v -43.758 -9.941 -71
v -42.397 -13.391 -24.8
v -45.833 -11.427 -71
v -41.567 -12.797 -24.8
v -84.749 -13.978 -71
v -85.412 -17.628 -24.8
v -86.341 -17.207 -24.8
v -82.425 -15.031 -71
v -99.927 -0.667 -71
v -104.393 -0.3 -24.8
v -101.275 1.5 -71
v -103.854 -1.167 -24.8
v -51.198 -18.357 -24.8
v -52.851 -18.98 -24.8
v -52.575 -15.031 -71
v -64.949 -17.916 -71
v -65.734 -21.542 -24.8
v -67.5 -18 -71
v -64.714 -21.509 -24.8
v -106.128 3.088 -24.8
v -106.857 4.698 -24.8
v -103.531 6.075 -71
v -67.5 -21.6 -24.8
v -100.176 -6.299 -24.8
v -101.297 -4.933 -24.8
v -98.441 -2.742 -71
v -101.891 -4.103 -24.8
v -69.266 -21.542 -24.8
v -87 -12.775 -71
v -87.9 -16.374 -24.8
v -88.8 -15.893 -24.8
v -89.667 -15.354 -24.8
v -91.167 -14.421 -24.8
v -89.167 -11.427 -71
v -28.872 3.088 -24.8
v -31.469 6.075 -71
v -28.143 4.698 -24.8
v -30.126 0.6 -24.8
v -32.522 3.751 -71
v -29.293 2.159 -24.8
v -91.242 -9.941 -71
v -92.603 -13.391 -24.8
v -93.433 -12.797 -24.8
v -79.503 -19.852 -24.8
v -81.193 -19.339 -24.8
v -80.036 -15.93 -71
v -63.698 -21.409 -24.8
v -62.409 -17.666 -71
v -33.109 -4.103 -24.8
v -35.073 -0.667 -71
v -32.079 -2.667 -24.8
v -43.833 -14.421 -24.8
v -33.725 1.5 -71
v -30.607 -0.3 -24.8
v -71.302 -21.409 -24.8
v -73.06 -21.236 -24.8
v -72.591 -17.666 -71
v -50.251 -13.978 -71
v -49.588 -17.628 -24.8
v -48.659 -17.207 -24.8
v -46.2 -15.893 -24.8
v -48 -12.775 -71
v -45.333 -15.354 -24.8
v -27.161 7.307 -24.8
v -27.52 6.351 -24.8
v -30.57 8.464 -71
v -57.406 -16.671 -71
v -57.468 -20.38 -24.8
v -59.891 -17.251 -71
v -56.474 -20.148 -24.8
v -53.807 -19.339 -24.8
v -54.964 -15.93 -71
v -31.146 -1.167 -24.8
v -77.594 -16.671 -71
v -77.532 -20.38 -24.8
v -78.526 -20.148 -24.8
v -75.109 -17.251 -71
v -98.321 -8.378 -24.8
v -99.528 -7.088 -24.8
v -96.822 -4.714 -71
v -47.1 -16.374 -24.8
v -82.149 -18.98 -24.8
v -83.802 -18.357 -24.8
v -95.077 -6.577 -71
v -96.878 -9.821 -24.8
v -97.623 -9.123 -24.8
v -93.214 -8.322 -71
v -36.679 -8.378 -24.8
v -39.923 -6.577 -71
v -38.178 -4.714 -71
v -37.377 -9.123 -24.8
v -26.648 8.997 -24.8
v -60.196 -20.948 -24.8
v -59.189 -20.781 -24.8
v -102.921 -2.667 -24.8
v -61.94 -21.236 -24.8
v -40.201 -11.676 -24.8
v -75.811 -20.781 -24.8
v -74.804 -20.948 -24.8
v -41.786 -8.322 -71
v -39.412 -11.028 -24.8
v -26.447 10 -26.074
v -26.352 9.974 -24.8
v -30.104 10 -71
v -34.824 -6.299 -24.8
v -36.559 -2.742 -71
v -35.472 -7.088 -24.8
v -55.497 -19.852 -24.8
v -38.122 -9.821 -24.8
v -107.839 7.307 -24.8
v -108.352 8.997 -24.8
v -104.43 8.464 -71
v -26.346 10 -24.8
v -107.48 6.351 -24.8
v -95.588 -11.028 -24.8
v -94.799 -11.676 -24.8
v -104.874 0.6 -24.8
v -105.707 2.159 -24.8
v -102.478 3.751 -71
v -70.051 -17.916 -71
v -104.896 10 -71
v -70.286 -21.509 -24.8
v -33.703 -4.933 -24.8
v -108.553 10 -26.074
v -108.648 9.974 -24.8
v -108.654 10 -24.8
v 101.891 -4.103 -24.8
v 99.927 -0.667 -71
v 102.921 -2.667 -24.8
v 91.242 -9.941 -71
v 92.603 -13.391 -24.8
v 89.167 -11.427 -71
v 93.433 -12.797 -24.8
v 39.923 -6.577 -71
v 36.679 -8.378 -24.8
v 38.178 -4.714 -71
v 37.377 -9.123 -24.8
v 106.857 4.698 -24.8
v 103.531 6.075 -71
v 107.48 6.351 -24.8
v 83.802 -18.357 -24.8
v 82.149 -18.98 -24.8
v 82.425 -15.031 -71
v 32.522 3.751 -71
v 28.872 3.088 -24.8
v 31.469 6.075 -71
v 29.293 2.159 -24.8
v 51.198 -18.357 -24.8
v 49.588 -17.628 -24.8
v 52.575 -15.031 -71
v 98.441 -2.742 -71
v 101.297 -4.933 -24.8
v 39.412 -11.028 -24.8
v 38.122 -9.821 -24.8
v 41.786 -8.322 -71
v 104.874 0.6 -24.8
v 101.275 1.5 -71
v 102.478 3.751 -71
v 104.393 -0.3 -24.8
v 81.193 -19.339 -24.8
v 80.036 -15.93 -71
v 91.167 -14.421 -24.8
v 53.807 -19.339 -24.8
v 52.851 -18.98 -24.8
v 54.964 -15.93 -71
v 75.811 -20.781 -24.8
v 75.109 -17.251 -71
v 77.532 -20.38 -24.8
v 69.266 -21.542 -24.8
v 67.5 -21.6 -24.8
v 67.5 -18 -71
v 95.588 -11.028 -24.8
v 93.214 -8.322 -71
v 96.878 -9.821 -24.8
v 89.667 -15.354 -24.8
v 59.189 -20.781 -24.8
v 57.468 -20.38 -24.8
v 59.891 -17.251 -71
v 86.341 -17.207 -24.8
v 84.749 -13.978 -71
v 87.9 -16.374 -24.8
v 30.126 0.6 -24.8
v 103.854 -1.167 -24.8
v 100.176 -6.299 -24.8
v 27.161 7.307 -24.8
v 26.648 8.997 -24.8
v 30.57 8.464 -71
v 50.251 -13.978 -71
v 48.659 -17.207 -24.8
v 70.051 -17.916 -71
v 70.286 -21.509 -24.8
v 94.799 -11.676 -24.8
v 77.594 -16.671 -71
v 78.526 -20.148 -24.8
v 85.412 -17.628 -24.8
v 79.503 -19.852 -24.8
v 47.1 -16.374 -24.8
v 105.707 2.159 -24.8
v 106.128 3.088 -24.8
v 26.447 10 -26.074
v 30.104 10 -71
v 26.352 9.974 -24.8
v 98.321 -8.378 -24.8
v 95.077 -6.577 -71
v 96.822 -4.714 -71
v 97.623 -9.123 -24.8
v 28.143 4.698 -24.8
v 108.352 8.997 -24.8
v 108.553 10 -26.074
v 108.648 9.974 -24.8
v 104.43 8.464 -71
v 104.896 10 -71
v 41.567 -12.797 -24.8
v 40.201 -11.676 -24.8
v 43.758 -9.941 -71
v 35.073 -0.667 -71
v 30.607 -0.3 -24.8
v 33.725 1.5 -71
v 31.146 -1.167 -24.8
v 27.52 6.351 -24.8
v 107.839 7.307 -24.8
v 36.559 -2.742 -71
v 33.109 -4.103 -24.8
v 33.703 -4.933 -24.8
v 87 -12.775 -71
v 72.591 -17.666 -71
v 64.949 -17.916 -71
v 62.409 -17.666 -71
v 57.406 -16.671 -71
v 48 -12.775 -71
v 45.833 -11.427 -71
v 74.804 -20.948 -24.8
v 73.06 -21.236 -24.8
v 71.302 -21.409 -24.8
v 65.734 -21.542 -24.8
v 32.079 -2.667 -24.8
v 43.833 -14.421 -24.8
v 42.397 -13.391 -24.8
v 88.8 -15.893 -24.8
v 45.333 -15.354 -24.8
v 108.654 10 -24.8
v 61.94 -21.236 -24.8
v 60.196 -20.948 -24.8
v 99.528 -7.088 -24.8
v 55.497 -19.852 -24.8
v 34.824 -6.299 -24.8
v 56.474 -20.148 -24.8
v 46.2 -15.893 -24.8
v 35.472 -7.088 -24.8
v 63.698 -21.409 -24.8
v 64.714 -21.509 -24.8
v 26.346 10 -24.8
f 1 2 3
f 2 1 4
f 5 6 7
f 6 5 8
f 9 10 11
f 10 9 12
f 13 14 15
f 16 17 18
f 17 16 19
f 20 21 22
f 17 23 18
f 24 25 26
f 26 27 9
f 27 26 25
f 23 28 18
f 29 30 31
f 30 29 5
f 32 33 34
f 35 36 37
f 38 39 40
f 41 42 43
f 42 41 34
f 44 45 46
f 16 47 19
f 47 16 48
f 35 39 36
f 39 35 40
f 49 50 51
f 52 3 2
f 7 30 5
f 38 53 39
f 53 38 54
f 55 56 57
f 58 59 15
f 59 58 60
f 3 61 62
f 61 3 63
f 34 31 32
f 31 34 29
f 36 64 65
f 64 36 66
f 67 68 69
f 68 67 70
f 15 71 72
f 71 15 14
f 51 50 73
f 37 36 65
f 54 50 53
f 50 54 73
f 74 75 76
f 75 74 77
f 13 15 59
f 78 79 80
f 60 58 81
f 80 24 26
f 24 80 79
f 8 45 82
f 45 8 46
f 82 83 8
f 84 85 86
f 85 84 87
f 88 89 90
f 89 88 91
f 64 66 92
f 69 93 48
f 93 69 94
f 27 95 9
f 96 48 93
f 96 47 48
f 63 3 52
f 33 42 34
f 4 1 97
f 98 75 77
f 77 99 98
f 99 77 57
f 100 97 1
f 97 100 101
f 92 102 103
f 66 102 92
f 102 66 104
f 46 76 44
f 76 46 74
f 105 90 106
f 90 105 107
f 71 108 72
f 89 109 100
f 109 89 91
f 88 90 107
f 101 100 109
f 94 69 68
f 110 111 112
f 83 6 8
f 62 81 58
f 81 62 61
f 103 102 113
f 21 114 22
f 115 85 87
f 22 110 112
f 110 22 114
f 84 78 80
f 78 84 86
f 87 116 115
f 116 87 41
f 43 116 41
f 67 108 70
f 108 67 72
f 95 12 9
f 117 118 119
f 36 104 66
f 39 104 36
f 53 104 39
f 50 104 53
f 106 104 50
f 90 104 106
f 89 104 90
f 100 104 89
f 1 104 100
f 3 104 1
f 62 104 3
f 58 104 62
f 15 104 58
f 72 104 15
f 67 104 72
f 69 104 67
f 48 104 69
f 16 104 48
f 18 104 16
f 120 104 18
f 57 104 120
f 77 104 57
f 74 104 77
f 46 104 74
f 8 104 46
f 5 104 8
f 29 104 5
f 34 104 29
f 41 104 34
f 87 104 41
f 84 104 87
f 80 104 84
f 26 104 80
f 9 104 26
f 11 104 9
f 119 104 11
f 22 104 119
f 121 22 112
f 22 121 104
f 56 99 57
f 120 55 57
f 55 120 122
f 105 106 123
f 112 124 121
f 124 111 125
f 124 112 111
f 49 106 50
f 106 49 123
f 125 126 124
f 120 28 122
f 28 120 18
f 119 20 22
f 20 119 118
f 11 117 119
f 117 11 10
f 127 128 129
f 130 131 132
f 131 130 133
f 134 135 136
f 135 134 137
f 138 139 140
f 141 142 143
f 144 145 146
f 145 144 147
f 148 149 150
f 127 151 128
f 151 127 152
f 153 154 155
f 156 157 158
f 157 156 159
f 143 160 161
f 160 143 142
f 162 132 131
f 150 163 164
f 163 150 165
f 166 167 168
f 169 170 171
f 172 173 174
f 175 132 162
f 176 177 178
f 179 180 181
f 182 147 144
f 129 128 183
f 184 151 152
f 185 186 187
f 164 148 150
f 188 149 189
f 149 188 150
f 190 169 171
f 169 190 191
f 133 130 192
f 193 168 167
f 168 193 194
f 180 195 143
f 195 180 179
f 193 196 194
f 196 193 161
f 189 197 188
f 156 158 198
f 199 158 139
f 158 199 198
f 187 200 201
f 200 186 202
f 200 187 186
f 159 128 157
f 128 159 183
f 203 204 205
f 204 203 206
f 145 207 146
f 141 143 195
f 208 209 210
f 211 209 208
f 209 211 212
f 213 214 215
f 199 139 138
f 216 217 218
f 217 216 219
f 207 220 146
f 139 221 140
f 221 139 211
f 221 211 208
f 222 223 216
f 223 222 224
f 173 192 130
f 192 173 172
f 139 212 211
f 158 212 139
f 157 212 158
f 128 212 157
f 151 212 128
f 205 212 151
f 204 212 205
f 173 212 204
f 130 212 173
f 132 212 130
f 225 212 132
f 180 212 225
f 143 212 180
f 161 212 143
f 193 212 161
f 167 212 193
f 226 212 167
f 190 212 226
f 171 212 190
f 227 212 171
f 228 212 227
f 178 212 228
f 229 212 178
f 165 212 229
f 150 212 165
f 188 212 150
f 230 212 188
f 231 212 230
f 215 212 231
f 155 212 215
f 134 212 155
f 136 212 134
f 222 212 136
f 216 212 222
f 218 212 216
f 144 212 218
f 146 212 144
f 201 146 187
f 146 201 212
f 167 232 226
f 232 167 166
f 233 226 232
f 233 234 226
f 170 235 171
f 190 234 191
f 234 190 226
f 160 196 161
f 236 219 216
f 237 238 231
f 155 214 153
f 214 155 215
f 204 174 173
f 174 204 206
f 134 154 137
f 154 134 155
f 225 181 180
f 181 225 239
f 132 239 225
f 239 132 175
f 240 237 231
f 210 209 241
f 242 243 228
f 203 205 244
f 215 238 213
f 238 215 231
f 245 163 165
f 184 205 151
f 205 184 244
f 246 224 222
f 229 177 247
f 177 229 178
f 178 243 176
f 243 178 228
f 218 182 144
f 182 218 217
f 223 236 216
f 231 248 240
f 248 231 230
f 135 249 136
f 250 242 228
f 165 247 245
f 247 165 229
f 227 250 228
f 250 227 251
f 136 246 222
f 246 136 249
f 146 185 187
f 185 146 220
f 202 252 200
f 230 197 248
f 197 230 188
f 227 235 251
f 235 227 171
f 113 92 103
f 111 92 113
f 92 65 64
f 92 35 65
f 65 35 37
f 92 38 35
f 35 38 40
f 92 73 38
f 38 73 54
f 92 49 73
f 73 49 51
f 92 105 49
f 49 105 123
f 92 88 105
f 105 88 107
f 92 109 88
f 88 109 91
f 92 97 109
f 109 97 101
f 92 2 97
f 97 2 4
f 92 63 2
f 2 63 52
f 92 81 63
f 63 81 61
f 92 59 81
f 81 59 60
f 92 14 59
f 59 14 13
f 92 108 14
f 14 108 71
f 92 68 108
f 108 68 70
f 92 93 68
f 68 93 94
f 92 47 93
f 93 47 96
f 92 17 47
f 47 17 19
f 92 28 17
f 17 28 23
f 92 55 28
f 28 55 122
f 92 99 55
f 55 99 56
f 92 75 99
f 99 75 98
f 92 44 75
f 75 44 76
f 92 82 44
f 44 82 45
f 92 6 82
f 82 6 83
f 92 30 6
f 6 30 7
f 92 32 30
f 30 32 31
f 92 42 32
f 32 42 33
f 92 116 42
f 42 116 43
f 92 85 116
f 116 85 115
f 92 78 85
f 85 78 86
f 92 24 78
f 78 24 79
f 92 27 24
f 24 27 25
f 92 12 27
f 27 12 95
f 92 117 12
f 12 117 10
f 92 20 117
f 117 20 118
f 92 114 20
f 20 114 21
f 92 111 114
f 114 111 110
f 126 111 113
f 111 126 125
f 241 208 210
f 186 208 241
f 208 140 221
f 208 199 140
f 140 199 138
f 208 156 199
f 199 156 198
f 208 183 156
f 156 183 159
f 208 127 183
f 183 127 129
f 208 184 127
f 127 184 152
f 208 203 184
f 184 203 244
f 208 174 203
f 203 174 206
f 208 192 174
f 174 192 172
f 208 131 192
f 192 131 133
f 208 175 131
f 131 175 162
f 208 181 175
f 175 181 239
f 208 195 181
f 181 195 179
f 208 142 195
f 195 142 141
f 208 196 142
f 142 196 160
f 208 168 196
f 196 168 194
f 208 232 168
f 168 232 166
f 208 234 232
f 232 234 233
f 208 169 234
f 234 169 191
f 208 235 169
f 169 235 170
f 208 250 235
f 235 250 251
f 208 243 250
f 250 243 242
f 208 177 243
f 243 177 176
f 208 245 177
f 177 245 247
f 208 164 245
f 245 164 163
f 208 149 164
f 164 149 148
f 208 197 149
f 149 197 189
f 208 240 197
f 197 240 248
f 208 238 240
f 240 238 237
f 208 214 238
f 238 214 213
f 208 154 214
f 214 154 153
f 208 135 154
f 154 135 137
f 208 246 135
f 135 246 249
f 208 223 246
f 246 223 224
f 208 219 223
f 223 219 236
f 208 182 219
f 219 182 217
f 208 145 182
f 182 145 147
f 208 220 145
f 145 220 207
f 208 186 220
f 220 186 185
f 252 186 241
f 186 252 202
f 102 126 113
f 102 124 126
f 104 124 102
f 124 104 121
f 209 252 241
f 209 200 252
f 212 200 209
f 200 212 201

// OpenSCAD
// file: ../../lib/project/util.scad
// lib/project/util.scad

module rounded_rect_2d(size = [10, 10], r = 2) {
  x = size[0];
  y = size[1];
  rr = min(r, min(x, y) / 2);

  hull() {
    for (sx = [-1, 1], sy = [-1, 1]) {
      translate([sx * (x / 2 - rr), sy * (y / 2 - rr)])
        circle(r = rr);
    }
  }
}
// file: ../../lib/project/params.scad
// lib/project/params.scad
// Shared project parameters for the final tray and all fit-test models.

debug = false;

// Main tray footprint.
tray_corner_r = 15;

// Top tray shell.
tray_floor_t = 2.4;
tray_wall_h = 14;
top_wall_w = 10;
glue_rabbet_h = 1.6;
glue_rabbet_w = 3.2;
glue_rabbet_side_clearance = 0.3;
glue_rabbet_vertical_clearance = 0.5;

// Underside support lip and rear support section.
support_lip_drop = 15;
support_lip_w = 10;
front_lip_back_extra = 5;
front_lip_bottom_back_extra = 0;
console_clear_w = 320;
side_lip_run = 170;
tray_w = console_clear_w + 2 * support_lip_w;
tray_d = side_lip_run + support_lip_w;
front_extension = 35;
rear_gap_w = 28;
rear_tongue_side_margin = 20;
rear_tongue_w = tray_w - 2 * rear_tongue_side_margin;
rear_tongue_depth = 34;
rear_tongue_t = 4.0;

// Cup holder location and plug geometry.
cup_spacing = 135;
// Confirmed from fit checks: move plugs 39 mm rearward from the prior position.
cup_y_from_front = 111;
plug_top_d = 90;
plug_bottom_d = 78;
plug_h = 71;
plug_shell_t = 1.6;
plug_clearance_z = 0;
cup_rim_w = 7;
cup_rim_h = 5;

// Optional underside splice plate for joining printed tray halves.
splice_plate_enable = true;
splice_plate_w = 120;
splice_plate_d = 18;
splice_plate_t = 2;
splice_plate_corner_r = 3;
splice_plate_y_from_front = 40;
splice_plate_side_clearance = 0.3;
splice_plate_vertical_clearance = 0.5;
rear_splice_plate_enable = true;
rear_splice_plate_y_from_front = 184;

// Fit-test defaults.
test_plug_top_ds = [84, 85, 86];
test_spacing_values = [116, 118, 120];
test_lip_drop_values = [8, 10, 12];
test_rear_tongue_ts = [1.4, 1.8, 2.2];
test_frame_wall_w = 12;
test_front_zone_depth = 100;
test_rear_zone_depth = 56;
test_gap_section_w = 140;
test_coupon_spacing = 18;
test_front_to_back_slice_w = 10;
test_rabbet_corner_section_size = 56;
test_rabbet_coupon_gap = 16;
test_rabbet_body_margin_from_groove = 15;
// main file
use <../../lib/project/console_tray.scad>;
include <../../lib/project/params.scad>;

front_edge_cup_zone_variant(
  tray_w = tray_w,
  tray_d = tray_d,
  tray_corner_r = tray_corner_r,
  tray_floor_t = tray_floor_t,
  tray_wall_h = tray_wall_h,
  top_wall_w = top_wall_w,
  support_lip_drop = support_lip_drop,
  support_lip_w = support_lip_w,
  front_lip_back_extra = front_lip_back_extra,
  front_lip_bottom_back_extra = front_lip_bottom_back_extra,
  rear_gap_w = rear_gap_w,
  rear_tongue_w = rear_tongue_w,
  rear_tongue_depth = rear_tongue_depth,
  rear_tongue_t = rear_tongue_t,
  cup_spacing = cup_spacing,
  cup_y_from_front = cup_y_from_front,
  plug_top_d = plug_top_d,
  plug_bottom_d = plug_bottom_d,
  plug_h = plug_h,
  cup_rim_w = cup_rim_w,
  cup_rim_h = cup_rim_h,
  front_zone_depth = test_front_zone_depth
);
